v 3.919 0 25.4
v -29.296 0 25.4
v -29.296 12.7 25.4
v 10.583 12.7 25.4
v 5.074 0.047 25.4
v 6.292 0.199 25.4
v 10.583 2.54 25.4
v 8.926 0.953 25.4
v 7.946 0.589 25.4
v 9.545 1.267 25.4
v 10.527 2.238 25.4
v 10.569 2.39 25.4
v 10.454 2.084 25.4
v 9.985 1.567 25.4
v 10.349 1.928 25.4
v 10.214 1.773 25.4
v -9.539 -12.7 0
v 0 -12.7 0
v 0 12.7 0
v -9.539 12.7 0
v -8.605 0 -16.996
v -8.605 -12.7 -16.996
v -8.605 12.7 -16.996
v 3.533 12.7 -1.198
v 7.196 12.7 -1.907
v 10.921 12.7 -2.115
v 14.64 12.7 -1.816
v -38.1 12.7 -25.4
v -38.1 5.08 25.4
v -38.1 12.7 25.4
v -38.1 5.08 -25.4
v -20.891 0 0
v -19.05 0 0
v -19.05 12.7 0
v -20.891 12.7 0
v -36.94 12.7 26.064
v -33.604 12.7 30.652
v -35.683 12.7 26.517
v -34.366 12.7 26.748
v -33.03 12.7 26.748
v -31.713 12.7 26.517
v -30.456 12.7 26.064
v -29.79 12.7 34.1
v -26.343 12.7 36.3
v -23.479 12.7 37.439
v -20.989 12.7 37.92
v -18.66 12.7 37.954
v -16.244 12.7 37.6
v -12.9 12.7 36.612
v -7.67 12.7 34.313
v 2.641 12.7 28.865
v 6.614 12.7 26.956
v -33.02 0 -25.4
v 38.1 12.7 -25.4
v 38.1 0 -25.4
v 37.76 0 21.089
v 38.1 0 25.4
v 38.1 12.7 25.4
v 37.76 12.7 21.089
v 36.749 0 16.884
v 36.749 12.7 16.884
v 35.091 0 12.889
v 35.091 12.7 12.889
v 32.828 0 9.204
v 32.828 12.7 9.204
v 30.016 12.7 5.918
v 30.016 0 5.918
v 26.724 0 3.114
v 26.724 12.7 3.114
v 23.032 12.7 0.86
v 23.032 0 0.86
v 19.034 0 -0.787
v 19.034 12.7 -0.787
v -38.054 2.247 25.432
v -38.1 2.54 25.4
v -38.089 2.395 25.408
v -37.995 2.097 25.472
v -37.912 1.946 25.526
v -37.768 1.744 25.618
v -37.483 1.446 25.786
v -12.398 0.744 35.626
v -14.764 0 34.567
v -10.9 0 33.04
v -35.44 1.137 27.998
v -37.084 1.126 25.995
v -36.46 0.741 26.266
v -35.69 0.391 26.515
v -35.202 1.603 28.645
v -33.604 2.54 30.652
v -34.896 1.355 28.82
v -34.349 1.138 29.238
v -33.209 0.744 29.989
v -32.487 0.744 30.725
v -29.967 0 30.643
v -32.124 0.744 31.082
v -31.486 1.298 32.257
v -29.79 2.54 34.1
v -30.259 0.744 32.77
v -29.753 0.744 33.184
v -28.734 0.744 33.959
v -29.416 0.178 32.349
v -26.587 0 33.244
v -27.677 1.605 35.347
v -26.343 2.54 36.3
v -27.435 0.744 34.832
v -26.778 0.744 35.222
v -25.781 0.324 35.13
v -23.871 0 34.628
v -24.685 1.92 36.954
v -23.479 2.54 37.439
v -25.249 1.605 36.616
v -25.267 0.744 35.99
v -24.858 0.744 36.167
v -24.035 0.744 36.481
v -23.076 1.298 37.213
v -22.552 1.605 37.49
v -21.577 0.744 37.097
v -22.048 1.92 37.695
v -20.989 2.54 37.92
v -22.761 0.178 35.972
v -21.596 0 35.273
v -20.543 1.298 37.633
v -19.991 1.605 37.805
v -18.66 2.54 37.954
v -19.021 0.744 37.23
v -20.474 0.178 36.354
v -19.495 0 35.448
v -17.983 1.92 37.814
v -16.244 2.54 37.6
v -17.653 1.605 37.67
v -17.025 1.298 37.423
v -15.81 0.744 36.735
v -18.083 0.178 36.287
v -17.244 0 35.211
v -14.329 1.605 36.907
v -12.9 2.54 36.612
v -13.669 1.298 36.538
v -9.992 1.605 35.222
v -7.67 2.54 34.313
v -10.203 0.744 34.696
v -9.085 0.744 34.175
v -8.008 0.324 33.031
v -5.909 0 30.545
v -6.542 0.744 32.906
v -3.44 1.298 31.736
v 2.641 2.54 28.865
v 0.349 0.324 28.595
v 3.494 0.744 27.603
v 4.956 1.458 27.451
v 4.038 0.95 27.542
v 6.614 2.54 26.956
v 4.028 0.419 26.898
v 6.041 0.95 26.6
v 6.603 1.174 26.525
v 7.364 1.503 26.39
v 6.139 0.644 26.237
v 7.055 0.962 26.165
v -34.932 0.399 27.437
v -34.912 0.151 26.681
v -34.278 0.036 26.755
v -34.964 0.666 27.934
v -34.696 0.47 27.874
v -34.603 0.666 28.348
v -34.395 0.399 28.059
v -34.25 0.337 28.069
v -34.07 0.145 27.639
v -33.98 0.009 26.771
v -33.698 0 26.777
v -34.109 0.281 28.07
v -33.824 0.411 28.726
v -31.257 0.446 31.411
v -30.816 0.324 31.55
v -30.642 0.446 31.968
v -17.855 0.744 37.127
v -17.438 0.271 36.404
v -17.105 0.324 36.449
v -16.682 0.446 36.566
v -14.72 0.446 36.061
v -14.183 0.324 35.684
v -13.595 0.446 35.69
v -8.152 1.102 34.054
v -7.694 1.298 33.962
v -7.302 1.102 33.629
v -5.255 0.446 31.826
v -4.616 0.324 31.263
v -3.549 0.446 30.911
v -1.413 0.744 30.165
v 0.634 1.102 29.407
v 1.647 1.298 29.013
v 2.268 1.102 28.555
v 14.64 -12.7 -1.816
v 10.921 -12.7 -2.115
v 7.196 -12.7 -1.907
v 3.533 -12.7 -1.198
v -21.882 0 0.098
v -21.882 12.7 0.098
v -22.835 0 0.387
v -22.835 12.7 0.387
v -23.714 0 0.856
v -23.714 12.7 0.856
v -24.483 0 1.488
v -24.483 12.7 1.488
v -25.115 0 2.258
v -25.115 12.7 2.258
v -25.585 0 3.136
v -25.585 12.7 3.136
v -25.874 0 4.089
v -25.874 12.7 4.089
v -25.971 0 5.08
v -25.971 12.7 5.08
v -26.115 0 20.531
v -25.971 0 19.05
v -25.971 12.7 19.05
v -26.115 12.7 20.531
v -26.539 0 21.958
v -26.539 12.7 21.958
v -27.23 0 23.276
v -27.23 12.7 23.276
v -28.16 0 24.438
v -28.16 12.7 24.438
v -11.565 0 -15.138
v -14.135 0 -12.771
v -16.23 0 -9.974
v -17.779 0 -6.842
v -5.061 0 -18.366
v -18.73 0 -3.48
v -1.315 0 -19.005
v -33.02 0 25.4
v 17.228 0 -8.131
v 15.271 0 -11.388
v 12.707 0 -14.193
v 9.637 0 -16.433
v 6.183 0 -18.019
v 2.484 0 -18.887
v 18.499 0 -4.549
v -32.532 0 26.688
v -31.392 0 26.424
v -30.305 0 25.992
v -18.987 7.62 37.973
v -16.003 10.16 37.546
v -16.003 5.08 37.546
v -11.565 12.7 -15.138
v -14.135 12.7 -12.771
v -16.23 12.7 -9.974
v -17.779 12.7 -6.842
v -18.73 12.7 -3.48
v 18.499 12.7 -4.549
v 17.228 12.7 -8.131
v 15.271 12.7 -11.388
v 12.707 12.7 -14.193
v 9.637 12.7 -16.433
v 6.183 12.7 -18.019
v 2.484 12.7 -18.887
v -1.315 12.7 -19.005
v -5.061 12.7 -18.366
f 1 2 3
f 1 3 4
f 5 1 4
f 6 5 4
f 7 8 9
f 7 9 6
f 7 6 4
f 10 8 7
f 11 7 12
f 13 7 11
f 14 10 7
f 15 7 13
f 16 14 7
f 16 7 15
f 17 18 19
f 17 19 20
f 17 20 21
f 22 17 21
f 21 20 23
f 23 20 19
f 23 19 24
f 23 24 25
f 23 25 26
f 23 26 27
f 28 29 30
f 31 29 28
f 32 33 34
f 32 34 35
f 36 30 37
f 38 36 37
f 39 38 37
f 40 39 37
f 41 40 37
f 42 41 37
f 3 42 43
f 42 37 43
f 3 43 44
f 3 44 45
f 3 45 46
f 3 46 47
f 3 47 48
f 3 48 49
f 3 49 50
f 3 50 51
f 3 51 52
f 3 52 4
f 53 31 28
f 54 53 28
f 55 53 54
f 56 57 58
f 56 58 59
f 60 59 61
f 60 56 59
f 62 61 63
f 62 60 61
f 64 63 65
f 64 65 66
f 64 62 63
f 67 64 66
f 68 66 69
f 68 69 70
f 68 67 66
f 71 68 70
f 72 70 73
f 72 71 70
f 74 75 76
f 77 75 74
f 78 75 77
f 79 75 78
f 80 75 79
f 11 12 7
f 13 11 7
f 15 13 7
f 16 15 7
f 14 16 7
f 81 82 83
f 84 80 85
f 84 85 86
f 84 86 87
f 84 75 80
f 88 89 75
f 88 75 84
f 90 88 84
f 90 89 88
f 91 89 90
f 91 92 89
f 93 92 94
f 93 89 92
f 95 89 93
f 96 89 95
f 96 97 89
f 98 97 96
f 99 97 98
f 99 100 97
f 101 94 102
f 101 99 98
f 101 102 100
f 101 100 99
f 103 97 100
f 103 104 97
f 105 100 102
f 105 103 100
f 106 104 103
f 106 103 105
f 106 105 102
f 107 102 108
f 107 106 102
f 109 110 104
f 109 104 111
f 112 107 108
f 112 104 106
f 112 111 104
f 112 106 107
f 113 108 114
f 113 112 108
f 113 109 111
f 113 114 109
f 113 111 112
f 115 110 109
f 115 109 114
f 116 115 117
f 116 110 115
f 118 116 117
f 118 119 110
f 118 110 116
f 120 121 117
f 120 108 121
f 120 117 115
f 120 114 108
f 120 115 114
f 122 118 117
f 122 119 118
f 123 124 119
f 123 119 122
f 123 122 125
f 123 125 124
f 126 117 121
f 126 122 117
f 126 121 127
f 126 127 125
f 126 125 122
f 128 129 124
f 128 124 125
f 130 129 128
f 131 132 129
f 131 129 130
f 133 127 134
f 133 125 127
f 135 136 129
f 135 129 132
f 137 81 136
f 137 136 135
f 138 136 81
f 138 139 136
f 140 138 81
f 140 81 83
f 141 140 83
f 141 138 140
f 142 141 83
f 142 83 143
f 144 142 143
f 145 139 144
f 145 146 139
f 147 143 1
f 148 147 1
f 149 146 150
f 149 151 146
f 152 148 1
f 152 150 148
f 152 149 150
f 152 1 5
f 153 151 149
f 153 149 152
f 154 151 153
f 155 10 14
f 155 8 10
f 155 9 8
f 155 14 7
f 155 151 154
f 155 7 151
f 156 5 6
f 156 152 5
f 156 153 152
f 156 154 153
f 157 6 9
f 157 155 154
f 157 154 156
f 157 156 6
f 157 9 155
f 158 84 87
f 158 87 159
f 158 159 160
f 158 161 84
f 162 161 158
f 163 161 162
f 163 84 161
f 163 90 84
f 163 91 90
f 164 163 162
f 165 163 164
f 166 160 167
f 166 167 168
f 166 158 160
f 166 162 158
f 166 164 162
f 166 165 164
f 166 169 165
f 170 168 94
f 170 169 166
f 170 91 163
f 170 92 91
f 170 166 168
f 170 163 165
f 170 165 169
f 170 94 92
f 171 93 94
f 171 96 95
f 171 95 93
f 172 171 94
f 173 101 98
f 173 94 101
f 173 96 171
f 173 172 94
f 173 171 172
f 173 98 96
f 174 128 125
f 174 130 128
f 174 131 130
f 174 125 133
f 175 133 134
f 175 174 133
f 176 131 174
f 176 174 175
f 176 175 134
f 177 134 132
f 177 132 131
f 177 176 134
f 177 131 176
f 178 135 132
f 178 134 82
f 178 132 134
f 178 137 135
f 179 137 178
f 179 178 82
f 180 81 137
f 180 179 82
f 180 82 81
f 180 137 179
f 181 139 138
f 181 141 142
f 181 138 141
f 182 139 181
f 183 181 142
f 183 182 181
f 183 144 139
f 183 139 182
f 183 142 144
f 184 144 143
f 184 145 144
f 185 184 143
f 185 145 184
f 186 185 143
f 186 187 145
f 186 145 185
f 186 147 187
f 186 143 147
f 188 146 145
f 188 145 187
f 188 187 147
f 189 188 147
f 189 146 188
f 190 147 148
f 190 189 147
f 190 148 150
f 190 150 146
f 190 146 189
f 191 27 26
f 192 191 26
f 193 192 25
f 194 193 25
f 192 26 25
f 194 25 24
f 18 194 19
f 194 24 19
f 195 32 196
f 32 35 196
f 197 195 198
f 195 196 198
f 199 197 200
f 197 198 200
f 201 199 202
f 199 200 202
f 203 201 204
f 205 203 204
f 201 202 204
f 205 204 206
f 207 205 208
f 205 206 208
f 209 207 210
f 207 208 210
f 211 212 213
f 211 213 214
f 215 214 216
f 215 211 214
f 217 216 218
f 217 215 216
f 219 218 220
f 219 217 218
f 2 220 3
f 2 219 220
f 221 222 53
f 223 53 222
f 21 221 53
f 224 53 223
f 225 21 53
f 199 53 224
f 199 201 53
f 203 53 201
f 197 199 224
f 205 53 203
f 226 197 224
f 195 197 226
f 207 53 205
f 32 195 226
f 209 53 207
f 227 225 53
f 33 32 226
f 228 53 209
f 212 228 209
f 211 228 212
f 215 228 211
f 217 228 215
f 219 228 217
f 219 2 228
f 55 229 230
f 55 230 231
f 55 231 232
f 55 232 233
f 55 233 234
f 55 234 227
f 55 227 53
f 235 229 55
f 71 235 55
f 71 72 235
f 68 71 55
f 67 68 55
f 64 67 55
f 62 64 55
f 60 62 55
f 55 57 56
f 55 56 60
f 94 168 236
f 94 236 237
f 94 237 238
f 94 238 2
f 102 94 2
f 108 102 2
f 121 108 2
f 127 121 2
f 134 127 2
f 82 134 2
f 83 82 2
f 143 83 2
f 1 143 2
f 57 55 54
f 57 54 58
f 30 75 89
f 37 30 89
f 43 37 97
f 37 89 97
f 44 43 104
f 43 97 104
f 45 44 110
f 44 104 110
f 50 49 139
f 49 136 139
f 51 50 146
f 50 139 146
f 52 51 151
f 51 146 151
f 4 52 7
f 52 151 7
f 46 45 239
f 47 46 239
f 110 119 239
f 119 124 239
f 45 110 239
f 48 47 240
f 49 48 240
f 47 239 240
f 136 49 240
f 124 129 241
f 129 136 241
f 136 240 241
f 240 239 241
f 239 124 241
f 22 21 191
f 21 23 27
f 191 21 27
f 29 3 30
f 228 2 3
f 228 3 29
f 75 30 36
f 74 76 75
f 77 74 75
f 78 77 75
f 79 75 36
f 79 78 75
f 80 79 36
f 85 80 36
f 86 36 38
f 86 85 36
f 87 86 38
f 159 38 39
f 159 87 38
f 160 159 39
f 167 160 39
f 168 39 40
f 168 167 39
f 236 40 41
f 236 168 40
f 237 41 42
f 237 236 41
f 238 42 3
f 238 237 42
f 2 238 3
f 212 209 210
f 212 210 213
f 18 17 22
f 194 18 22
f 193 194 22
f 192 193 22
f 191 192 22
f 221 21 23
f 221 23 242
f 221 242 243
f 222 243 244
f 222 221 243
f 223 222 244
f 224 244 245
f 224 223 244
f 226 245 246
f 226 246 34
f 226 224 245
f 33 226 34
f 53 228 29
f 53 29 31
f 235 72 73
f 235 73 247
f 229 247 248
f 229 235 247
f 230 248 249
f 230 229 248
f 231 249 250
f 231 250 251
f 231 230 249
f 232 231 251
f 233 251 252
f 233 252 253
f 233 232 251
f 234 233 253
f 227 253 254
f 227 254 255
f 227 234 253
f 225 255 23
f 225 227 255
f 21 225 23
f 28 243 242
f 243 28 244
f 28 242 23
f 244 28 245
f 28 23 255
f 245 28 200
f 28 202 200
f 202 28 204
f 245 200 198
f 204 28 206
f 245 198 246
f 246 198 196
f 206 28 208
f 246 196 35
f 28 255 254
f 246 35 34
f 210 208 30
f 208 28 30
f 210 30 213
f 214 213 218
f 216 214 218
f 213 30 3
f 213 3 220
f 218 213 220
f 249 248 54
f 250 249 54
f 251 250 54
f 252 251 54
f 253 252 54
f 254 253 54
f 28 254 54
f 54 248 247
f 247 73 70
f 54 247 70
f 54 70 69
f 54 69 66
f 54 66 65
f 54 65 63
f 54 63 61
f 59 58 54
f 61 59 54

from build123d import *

# Parameters (mm, degrees)
F1_DEPTH = 12.7
F2_DEPTH = 25.4
F3_R     = 2.54
F5_SIZE  = 5.08
F6_R     = 5.08


# Not quite as in the source:
# - a feature of the source that left no trace in its solid (it failed there, or was rolled back) is left out


with BuildPart() as f1:
    # F0 (on Front) → F1 (new body)
    with BuildSketch(Plane.XZ):
        with BuildLine():
            ThreePointArc((14.6395320428, -1.8160650439), (7.1957981438, -1.9073534013), (0, 0))
            Line((0, 0), (-9.5393729797, 0))
            Line((-9.5393729797, 0), (-8.6053529899, -16.9955994281))
            Line((-8.6053529899, -16.9955994281), (14.6395320428, -1.8160650439))
        make_face()
    extrude(amount=-F1_DEPTH)

    # F2 (add): a face of the model
    f2_faces = [f1.faces().sort_by_distance(p)[0] for p in [
        (-1.4587062215, 12.7, -6.2717912086),
    ]]


with BuildPart() as f1b:
    # F0 (on Front) → F1, piece 2 (new body)
    with BuildSketch(Plane.XZ):
        with BuildLine():
            ThreePointArc((-8.6053529899, -16.9955994281), (-16.2301336171, -9.9742299338), (-19.05, 0))
            Line((-19.05, 0), (-25.971364924, 0))
            Line((-25.971364924, 0), (-25.971364924, 19.05))
            ThreePointArc((-25.971364924, 19.05), (-26.8527815535, 22.633827134), (-29.2959352279, 25.4))
            Line((-29.2959352279, 25.4), (-38.1, 25.4))
            Line((-38.1, 25.4), (-38.1, -25.4))
            Line((-38.1, -25.4), (38.1, -25.4))
            Line((38.1, -25.4), (38.1, 25.4))
            ThreePointArc((38.1, 25.4), (32.8284890456, 9.2037043809), (19.0337377265, -0.7869740527))
            ThreePointArc((19.0337377265, -0.7869740527), (9.6367881679, -16.4327360414), (-8.6053529899, -16.9955994281))
        make_face()
    extrude(amount=-F1_DEPTH)


with BuildPart() as f1c:
    # F0 (on Front) → F1, piece 3 (new body)
    with BuildSketch(Plane.XZ):
        with BuildLine():
            ThreePointArc((-38.1, 25.4), (-33.6979676139, 26.7766026899), (-29.2959352279, 25.4))
            Line((-29.2959352279, 25.4), (10.5833333333, 25.4))
            add(Edge.make_bspline(
                [(-38.1, 25.4), (-32.4034356926, 32.7258786812), (-19.1819964183, 44.9419170764), (0.319873071, 28.826665029), (10.5833333333, 25.4)],
                knots=[0, 0, 0, 0, 0.304709608, 0.6658251219, 0.6658251219, 0.6658251219, 0.6658251219], degree=3))
        make_face()
    extrude(amount=-F1_DEPTH)

    # F3
    f3_edges = [f1c.edges().sort_by_distance(p)[0] for p in [
        (-14.799697, 0, 37.233797),
    ]]
    fillet(f3_edges, radius=F3_R)


with BuildPart() as f1_1:
    add(f1.part)

    add(f1b.part)  # F2 merges F1b
    extrude(f2_faces, amount=-F2_DEPTH)

    # F5
    f5_edges = [f1_1.edges().sort_by_distance(p)[0] for p in [
        (-38.1, 0, 0),
    ]]
    chamfer(f5_edges, length=F5_SIZE)

    # F6
    f6_edges = [f1_1.edges().sort_by_distance(p)[0] for p in [
        (-25.971365, 6.35, 0),
    ]]
    fillet(f6_edges, radius=F6_R)


solid = Compound([f1c.part, f1_1.part])
